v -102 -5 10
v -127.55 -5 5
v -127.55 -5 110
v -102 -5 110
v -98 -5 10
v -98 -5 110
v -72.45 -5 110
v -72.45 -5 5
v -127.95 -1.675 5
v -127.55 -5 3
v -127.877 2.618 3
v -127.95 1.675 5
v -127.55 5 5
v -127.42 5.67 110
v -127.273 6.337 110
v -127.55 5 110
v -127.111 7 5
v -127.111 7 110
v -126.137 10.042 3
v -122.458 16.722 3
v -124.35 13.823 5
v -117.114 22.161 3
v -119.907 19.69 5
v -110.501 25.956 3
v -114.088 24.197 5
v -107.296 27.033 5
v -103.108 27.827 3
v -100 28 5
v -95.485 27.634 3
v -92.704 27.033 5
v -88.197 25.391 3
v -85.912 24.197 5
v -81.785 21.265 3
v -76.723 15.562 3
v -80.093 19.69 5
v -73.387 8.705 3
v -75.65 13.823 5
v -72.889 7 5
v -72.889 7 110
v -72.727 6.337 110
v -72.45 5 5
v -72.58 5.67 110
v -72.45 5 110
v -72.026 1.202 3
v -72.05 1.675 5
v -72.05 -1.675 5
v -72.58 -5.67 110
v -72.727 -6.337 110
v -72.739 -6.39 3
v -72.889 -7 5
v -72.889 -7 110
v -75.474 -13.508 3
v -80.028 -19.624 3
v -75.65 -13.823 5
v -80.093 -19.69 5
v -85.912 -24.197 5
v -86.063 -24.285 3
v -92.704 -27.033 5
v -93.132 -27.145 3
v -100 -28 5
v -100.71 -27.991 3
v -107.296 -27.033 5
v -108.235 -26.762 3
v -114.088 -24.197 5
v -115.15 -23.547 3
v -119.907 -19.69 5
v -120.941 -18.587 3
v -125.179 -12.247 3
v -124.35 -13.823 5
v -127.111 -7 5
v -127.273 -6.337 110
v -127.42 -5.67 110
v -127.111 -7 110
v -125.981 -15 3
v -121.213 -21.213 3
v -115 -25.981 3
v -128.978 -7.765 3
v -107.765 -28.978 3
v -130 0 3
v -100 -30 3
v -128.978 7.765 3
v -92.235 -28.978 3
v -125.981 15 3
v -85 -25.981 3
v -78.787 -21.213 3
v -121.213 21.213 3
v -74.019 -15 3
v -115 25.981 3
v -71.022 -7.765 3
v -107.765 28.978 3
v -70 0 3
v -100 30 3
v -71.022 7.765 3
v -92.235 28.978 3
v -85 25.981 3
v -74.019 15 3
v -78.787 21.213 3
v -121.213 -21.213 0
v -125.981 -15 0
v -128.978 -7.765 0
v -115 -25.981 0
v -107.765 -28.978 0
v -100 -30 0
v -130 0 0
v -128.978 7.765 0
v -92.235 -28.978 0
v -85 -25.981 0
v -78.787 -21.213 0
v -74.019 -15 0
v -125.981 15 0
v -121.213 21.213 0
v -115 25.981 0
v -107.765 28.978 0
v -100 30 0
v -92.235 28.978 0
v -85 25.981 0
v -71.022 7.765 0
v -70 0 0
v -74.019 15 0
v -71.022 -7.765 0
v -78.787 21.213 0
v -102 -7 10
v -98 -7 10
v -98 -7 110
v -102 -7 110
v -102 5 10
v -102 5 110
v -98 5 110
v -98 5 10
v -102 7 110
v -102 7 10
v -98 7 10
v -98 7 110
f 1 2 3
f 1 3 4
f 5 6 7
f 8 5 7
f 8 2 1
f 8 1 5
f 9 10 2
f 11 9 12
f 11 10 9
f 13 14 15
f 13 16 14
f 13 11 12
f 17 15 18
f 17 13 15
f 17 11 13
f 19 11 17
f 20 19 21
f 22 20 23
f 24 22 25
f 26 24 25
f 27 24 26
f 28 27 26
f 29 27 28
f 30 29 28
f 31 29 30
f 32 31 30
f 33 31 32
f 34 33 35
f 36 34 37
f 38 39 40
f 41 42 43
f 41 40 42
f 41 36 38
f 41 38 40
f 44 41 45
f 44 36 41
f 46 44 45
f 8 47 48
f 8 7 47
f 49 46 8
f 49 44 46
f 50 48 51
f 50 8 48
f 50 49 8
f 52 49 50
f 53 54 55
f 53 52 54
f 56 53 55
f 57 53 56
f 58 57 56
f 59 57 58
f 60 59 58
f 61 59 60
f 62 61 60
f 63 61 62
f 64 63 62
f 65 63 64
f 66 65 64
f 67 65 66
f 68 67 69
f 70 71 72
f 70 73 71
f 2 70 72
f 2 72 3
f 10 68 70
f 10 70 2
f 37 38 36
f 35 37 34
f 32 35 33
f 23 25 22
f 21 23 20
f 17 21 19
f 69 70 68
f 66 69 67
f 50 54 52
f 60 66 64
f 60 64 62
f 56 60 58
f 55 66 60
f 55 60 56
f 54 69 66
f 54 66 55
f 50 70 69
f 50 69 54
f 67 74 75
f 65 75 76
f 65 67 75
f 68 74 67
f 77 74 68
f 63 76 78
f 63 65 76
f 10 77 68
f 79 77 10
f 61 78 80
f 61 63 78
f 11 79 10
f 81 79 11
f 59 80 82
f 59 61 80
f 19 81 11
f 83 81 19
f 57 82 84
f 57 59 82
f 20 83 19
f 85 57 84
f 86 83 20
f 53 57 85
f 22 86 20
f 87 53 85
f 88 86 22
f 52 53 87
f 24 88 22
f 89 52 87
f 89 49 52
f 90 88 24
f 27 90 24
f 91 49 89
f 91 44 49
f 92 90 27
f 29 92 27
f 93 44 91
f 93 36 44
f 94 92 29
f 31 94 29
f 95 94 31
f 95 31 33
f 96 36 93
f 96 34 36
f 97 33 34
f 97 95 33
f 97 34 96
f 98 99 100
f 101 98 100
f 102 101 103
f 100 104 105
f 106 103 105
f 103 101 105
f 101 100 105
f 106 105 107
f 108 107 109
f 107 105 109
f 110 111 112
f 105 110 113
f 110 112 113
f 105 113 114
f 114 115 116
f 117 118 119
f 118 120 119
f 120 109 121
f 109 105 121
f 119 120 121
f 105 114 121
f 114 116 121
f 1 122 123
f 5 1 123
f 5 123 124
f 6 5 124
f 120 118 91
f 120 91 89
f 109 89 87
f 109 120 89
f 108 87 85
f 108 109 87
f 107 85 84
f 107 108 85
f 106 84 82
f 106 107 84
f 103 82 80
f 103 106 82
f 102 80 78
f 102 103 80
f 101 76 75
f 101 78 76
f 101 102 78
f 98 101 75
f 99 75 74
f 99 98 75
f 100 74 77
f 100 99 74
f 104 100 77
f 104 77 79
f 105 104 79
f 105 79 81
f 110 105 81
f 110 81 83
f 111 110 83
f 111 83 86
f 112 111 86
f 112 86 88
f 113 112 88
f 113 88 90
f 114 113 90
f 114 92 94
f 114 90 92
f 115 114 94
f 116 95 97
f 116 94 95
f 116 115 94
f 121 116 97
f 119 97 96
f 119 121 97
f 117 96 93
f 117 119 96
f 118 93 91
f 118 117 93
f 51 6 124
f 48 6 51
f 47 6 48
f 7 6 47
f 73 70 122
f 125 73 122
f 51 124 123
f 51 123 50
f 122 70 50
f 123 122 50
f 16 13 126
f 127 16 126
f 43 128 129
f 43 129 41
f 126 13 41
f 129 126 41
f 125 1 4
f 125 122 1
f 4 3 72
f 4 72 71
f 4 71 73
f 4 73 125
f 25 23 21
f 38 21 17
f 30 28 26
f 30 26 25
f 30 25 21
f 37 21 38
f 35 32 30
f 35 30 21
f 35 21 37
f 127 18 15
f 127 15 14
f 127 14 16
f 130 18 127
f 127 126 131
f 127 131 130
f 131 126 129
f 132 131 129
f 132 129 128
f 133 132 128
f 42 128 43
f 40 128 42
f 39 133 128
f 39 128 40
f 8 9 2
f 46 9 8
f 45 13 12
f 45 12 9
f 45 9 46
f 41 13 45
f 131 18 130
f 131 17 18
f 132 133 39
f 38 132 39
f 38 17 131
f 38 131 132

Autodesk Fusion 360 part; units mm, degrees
sketch "Base" plane through (0, 0, 0) normal (0, 0, 1) x (1, 0, 0)
  circle A0 centre (0, 0) radius 30
  circle A1 centre (0, 0) radius 28
  dimension "d1" = 60
  dimension "d2" = 56
extrude "Extrude1" add sketch "Base" along normal blind 2 contours A1 makes body 1
extrude "Extrude2" add sketch "Base" along normal blind 113 bodies 1
sketch "Sketch2" plane through (0, 0, 0) normal (0, 0, 1) x (1, 0, 0)
  circle A0 centre (0, 0) radius 28
  line L0 (0, -2) -> (27.9285, -2)
  line L1 (-27.9285, -2) -> (0, -2)
  line L2 (0, 2) -> (-27.9285, 2)
  line L3 (27.9285, 2) -> (0, 2)
  circle A1 centre (0, 0) radius 30
extrude "Extrude3" add sketch "Sketch2" along normal blind 3 separate body makes body 2
extrude "Extrude4" add sketch "Sketch2" along normal blind 5 contours A0 L0 L1 bodies 2
extrude "Extrude5" add sketch "Sketch2" along normal blind 5 contours A0 L2 L3 bodies 2
extrude "Extrude6" add sketch "Sketch2" along normal blind 110 contours A0 L0 L1 L2 L3 bodies 2
sketch "Sketch6" plane through (0, 2, 0) normal (0, 1, 0) x (-1, 0, 0)
  line L0 (-27.9285, 5) -> (27.9285, 5)
  line L1 (27.9285, 5) -> (27.9285, 110)
  line L2 (27.9285, 110) -> (-27.9285, 110)
  line L3 (-27.9285, 110) -> (-27.9285, 5)
  line L4 (-2.5, 7.5) -> (2.5, 7.5)
  line L5 (2.5, 7.5) -> (2.5, 110)
  line L6 (-2.5, 110) -> (2.5, 110)
  line L7 (-2.5, 110) -> (-2.5, 7.5)
  dimension "d15" = 102.5
  dimension "d16" = 5
extrude "Extrude7" cut sketch "Sketch6" against normal blind 4 contours L2 L4 L5 L6 L7 bodies 2
sketch "Sketch7" plane through (0, 0, 0) normal (0, 0, 1) x (1, 0, 0)
  circle A0 centre (-100, 0) radius 30
  circle A1 centre (-100, 0) radius 28
  line L0 (-100, 5) -> (-72.45, 5)
  line L1 (-100, -5) -> (-72.45, -5)
  line L2 (-100, -5) -> (-127.55, -5)
  line L3 (-100, 5) -> (-127.55, 5)
  line L4 (-100, -7) -> (-72.8891, -7)
  line L5 (-100, -7) -> (-127.1109, -7)
  line L6 (-100, 7) -> (-72.8891, 7)
  line L7 (-100, 7) -> (-127.1109, 7)
extrude "Extrude8" add sketch "Sketch7" along normal blind 3 separate body makes body 3
extrude "Extrude9" add sketch "Sketch7" along normal blind 5 contours A1 L6 L7 bodies 3
extrude "Extrude10" add sketch "Sketch7" along normal blind 5 contours A1 L0 L1 L2 L3 bodies 3
extrude "Extrude11" add sketch "Sketch7" along normal blind 5 contours A1 L4 L5 bodies 3
extrude "Extrude12" add sketch "Sketch7" along normal blind 110 contours A1 L0 L3 L6 L7 bodies 3
extrude "Extrude13" add sketch "Sketch7" along normal blind 110 contours A1 L1 L2 L4 L5 bodies 3
sketch "Sketch8" plane through (0, -7, 0) normal (0, -1, 0) x (1, 0, 0)
  line L0 (-127.1109, 5) -> (-72.8891, 5)
  line L1 (-72.8891, 5) -> (-72.8891, 110)
  line L2 (-72.8891, 110) -> (-127.1109, 110)
  line L3 (-127.1109, 110) -> (-127.1109, 5)
  line L4 (-102, 10) -> (-98, 10)
  line L5 (-98, 10) -> (-98, 110)
  line L6 (-102, 10) -> (-102, 110)
extrude "Extrude14" cut sketch "Sketch8" against normal blind 200 contours L2 L4 L5 L6 bodies 3
hidden bodies 1 2
